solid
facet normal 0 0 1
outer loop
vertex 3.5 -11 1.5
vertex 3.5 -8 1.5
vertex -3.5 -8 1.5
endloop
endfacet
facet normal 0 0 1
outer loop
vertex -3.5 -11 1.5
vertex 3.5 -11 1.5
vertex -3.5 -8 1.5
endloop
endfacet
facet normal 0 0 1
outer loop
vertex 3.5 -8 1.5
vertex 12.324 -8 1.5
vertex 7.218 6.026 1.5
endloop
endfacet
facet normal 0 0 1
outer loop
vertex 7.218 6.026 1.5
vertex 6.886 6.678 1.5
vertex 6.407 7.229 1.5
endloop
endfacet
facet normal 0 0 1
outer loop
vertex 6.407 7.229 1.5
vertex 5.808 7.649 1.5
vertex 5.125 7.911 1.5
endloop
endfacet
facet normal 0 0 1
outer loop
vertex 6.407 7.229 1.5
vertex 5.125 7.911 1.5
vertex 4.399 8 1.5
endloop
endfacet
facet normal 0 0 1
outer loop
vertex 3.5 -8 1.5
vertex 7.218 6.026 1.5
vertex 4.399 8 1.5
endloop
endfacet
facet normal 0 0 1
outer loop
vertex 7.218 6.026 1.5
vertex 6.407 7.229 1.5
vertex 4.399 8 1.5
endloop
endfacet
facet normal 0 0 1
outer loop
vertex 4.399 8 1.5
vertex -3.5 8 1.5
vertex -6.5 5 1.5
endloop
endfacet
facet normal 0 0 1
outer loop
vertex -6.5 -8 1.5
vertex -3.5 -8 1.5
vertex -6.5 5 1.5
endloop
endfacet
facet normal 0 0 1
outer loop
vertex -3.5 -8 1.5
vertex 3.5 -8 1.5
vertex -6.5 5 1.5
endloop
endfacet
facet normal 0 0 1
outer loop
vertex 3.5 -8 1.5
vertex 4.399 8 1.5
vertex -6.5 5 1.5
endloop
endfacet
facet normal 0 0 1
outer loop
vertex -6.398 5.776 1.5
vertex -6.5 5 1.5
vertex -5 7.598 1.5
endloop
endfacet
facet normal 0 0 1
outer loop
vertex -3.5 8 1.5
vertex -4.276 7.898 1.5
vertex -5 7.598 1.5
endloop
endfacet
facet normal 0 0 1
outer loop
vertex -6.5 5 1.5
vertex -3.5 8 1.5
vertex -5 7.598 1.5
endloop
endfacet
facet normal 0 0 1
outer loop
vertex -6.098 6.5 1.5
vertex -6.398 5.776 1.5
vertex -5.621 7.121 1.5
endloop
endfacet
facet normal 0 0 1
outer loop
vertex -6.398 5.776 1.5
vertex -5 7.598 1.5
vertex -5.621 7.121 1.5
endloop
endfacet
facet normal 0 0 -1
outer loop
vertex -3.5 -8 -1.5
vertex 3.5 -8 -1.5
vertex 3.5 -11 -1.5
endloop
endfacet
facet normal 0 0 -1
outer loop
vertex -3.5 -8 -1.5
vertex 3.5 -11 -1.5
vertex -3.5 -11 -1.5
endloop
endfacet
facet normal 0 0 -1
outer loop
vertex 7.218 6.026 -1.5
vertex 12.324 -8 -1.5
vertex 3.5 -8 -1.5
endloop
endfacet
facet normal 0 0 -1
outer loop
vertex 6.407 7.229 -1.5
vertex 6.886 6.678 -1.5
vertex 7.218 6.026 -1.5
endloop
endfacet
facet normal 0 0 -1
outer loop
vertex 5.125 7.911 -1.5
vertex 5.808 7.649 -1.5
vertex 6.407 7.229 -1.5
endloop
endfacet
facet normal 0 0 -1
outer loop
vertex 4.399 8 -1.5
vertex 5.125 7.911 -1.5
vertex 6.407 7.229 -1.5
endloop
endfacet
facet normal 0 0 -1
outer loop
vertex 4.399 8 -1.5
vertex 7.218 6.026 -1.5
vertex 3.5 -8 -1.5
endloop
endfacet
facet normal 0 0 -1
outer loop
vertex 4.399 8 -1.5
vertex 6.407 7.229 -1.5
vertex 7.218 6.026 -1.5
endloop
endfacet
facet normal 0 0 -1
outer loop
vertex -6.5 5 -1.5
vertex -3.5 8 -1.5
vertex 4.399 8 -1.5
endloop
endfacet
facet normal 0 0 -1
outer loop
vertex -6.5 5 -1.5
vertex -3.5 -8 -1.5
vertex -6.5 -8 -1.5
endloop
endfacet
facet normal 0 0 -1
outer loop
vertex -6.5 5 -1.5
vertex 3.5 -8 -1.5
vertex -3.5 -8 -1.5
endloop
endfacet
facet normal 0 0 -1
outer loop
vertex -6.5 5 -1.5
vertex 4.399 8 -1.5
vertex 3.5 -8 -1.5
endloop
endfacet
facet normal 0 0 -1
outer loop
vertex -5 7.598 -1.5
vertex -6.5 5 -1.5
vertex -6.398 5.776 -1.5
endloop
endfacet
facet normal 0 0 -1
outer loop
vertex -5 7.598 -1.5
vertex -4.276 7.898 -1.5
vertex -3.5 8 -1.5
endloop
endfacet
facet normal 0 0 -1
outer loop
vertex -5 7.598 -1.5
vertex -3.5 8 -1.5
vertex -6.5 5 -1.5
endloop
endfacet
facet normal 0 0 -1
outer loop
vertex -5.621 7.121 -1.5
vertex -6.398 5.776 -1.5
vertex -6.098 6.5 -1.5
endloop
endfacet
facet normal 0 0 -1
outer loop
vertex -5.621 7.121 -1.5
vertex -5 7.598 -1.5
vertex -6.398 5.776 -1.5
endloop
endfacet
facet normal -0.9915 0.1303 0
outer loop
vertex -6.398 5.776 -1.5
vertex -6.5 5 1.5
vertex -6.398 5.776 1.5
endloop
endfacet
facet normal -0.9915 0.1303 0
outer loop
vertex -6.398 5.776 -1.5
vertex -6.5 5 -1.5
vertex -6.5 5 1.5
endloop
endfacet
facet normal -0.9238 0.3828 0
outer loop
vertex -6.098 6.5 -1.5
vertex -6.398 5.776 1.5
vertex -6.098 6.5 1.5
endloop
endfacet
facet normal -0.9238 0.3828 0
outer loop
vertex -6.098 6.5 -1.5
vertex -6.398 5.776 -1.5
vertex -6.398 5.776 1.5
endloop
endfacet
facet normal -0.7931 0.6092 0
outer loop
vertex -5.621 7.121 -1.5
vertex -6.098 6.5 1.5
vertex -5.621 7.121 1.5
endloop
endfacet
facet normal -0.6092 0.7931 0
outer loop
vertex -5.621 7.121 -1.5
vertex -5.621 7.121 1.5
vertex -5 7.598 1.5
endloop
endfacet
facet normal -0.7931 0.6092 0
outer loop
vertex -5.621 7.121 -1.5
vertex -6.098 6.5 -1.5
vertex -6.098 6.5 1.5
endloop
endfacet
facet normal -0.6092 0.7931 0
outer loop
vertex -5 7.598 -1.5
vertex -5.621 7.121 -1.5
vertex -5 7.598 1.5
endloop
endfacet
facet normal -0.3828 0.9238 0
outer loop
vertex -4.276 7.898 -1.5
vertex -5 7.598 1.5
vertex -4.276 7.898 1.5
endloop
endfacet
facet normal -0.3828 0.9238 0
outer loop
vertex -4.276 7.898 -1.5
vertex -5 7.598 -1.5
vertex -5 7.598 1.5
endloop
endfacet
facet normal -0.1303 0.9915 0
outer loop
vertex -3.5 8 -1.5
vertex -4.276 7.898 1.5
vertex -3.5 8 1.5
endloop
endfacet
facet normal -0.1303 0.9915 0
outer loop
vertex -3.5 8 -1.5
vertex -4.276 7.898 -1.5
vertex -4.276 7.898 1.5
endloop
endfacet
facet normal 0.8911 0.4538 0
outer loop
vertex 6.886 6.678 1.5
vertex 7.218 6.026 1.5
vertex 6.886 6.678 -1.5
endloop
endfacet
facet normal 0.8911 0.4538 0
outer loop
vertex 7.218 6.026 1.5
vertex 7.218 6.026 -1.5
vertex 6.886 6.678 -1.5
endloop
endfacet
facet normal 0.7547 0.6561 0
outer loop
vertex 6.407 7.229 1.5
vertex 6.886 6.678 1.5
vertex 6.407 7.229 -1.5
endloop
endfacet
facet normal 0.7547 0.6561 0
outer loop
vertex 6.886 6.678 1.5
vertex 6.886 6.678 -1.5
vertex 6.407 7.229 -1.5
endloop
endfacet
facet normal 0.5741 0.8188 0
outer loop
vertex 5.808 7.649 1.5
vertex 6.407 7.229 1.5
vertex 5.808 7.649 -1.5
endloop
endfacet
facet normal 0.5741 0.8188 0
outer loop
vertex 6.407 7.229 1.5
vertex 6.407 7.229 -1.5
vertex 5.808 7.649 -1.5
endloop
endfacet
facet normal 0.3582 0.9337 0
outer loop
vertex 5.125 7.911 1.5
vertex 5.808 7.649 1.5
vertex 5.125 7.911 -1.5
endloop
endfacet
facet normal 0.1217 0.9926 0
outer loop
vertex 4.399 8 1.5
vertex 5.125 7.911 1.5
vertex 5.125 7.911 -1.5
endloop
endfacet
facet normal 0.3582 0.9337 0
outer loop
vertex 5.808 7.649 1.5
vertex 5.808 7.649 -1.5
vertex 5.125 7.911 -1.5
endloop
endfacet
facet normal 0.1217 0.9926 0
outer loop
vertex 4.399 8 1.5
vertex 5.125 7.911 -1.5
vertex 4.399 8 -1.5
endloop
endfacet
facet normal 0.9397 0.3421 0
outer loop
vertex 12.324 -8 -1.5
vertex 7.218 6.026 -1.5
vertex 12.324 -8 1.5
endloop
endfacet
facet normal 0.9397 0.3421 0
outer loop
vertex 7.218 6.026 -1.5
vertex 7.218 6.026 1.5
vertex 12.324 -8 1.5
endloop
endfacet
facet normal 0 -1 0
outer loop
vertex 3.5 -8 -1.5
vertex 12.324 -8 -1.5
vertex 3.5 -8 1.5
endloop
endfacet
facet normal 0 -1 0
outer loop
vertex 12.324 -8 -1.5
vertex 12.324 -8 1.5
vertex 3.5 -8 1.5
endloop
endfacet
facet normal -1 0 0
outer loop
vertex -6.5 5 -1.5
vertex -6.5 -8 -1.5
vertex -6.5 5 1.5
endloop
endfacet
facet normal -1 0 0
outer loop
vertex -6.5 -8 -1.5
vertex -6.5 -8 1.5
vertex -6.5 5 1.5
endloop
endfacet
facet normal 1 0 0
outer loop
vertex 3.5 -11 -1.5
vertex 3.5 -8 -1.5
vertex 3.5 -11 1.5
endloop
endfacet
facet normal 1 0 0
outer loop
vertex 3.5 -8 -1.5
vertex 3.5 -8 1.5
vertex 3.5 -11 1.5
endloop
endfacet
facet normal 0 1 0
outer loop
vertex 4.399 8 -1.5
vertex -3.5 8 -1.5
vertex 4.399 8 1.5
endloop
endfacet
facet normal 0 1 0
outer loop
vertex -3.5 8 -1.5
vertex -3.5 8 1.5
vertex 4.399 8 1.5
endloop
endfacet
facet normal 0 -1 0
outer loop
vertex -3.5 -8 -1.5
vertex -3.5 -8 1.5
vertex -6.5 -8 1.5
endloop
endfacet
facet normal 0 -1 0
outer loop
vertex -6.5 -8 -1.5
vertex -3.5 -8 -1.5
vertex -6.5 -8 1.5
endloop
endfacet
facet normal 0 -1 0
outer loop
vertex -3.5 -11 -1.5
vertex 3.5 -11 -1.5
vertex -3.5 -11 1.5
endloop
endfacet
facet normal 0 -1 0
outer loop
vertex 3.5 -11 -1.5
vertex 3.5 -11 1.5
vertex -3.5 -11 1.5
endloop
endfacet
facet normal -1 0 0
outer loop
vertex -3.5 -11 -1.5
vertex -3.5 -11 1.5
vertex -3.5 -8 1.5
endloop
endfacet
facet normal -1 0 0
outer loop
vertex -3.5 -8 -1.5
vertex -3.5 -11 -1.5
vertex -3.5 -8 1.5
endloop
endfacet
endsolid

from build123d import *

# Parameters (mm, degrees)
RESSALTO_EXTRUS_O1_DEPTH = 1.5
FILETE1_R                = 3


with BuildPart() as part:
    # Esboço1 → Ressalto-extrusão1 (new, symmetric)
    with BuildSketch(Plane.XY):
        Polygon((-6.5, -8), (-6.5, 8), (6.5, 8), (12.323523748, -8), (3.5, -8), (3.5, -11), (-3.5, -11), (-3.5, -8), align=None)
    extrude(amount=RESSALTO_EXTRUS_O1_DEPTH, both=True)

    # Filete1
    filete1_edges = [part.edges().sort_by_distance(p)[0] for p in [
        (-6.5, 8, 0),
        (6.5, 8, 0),
    ]]
    fillet(filete1_edges, radius=FILETE1_R)


solid = part.part
